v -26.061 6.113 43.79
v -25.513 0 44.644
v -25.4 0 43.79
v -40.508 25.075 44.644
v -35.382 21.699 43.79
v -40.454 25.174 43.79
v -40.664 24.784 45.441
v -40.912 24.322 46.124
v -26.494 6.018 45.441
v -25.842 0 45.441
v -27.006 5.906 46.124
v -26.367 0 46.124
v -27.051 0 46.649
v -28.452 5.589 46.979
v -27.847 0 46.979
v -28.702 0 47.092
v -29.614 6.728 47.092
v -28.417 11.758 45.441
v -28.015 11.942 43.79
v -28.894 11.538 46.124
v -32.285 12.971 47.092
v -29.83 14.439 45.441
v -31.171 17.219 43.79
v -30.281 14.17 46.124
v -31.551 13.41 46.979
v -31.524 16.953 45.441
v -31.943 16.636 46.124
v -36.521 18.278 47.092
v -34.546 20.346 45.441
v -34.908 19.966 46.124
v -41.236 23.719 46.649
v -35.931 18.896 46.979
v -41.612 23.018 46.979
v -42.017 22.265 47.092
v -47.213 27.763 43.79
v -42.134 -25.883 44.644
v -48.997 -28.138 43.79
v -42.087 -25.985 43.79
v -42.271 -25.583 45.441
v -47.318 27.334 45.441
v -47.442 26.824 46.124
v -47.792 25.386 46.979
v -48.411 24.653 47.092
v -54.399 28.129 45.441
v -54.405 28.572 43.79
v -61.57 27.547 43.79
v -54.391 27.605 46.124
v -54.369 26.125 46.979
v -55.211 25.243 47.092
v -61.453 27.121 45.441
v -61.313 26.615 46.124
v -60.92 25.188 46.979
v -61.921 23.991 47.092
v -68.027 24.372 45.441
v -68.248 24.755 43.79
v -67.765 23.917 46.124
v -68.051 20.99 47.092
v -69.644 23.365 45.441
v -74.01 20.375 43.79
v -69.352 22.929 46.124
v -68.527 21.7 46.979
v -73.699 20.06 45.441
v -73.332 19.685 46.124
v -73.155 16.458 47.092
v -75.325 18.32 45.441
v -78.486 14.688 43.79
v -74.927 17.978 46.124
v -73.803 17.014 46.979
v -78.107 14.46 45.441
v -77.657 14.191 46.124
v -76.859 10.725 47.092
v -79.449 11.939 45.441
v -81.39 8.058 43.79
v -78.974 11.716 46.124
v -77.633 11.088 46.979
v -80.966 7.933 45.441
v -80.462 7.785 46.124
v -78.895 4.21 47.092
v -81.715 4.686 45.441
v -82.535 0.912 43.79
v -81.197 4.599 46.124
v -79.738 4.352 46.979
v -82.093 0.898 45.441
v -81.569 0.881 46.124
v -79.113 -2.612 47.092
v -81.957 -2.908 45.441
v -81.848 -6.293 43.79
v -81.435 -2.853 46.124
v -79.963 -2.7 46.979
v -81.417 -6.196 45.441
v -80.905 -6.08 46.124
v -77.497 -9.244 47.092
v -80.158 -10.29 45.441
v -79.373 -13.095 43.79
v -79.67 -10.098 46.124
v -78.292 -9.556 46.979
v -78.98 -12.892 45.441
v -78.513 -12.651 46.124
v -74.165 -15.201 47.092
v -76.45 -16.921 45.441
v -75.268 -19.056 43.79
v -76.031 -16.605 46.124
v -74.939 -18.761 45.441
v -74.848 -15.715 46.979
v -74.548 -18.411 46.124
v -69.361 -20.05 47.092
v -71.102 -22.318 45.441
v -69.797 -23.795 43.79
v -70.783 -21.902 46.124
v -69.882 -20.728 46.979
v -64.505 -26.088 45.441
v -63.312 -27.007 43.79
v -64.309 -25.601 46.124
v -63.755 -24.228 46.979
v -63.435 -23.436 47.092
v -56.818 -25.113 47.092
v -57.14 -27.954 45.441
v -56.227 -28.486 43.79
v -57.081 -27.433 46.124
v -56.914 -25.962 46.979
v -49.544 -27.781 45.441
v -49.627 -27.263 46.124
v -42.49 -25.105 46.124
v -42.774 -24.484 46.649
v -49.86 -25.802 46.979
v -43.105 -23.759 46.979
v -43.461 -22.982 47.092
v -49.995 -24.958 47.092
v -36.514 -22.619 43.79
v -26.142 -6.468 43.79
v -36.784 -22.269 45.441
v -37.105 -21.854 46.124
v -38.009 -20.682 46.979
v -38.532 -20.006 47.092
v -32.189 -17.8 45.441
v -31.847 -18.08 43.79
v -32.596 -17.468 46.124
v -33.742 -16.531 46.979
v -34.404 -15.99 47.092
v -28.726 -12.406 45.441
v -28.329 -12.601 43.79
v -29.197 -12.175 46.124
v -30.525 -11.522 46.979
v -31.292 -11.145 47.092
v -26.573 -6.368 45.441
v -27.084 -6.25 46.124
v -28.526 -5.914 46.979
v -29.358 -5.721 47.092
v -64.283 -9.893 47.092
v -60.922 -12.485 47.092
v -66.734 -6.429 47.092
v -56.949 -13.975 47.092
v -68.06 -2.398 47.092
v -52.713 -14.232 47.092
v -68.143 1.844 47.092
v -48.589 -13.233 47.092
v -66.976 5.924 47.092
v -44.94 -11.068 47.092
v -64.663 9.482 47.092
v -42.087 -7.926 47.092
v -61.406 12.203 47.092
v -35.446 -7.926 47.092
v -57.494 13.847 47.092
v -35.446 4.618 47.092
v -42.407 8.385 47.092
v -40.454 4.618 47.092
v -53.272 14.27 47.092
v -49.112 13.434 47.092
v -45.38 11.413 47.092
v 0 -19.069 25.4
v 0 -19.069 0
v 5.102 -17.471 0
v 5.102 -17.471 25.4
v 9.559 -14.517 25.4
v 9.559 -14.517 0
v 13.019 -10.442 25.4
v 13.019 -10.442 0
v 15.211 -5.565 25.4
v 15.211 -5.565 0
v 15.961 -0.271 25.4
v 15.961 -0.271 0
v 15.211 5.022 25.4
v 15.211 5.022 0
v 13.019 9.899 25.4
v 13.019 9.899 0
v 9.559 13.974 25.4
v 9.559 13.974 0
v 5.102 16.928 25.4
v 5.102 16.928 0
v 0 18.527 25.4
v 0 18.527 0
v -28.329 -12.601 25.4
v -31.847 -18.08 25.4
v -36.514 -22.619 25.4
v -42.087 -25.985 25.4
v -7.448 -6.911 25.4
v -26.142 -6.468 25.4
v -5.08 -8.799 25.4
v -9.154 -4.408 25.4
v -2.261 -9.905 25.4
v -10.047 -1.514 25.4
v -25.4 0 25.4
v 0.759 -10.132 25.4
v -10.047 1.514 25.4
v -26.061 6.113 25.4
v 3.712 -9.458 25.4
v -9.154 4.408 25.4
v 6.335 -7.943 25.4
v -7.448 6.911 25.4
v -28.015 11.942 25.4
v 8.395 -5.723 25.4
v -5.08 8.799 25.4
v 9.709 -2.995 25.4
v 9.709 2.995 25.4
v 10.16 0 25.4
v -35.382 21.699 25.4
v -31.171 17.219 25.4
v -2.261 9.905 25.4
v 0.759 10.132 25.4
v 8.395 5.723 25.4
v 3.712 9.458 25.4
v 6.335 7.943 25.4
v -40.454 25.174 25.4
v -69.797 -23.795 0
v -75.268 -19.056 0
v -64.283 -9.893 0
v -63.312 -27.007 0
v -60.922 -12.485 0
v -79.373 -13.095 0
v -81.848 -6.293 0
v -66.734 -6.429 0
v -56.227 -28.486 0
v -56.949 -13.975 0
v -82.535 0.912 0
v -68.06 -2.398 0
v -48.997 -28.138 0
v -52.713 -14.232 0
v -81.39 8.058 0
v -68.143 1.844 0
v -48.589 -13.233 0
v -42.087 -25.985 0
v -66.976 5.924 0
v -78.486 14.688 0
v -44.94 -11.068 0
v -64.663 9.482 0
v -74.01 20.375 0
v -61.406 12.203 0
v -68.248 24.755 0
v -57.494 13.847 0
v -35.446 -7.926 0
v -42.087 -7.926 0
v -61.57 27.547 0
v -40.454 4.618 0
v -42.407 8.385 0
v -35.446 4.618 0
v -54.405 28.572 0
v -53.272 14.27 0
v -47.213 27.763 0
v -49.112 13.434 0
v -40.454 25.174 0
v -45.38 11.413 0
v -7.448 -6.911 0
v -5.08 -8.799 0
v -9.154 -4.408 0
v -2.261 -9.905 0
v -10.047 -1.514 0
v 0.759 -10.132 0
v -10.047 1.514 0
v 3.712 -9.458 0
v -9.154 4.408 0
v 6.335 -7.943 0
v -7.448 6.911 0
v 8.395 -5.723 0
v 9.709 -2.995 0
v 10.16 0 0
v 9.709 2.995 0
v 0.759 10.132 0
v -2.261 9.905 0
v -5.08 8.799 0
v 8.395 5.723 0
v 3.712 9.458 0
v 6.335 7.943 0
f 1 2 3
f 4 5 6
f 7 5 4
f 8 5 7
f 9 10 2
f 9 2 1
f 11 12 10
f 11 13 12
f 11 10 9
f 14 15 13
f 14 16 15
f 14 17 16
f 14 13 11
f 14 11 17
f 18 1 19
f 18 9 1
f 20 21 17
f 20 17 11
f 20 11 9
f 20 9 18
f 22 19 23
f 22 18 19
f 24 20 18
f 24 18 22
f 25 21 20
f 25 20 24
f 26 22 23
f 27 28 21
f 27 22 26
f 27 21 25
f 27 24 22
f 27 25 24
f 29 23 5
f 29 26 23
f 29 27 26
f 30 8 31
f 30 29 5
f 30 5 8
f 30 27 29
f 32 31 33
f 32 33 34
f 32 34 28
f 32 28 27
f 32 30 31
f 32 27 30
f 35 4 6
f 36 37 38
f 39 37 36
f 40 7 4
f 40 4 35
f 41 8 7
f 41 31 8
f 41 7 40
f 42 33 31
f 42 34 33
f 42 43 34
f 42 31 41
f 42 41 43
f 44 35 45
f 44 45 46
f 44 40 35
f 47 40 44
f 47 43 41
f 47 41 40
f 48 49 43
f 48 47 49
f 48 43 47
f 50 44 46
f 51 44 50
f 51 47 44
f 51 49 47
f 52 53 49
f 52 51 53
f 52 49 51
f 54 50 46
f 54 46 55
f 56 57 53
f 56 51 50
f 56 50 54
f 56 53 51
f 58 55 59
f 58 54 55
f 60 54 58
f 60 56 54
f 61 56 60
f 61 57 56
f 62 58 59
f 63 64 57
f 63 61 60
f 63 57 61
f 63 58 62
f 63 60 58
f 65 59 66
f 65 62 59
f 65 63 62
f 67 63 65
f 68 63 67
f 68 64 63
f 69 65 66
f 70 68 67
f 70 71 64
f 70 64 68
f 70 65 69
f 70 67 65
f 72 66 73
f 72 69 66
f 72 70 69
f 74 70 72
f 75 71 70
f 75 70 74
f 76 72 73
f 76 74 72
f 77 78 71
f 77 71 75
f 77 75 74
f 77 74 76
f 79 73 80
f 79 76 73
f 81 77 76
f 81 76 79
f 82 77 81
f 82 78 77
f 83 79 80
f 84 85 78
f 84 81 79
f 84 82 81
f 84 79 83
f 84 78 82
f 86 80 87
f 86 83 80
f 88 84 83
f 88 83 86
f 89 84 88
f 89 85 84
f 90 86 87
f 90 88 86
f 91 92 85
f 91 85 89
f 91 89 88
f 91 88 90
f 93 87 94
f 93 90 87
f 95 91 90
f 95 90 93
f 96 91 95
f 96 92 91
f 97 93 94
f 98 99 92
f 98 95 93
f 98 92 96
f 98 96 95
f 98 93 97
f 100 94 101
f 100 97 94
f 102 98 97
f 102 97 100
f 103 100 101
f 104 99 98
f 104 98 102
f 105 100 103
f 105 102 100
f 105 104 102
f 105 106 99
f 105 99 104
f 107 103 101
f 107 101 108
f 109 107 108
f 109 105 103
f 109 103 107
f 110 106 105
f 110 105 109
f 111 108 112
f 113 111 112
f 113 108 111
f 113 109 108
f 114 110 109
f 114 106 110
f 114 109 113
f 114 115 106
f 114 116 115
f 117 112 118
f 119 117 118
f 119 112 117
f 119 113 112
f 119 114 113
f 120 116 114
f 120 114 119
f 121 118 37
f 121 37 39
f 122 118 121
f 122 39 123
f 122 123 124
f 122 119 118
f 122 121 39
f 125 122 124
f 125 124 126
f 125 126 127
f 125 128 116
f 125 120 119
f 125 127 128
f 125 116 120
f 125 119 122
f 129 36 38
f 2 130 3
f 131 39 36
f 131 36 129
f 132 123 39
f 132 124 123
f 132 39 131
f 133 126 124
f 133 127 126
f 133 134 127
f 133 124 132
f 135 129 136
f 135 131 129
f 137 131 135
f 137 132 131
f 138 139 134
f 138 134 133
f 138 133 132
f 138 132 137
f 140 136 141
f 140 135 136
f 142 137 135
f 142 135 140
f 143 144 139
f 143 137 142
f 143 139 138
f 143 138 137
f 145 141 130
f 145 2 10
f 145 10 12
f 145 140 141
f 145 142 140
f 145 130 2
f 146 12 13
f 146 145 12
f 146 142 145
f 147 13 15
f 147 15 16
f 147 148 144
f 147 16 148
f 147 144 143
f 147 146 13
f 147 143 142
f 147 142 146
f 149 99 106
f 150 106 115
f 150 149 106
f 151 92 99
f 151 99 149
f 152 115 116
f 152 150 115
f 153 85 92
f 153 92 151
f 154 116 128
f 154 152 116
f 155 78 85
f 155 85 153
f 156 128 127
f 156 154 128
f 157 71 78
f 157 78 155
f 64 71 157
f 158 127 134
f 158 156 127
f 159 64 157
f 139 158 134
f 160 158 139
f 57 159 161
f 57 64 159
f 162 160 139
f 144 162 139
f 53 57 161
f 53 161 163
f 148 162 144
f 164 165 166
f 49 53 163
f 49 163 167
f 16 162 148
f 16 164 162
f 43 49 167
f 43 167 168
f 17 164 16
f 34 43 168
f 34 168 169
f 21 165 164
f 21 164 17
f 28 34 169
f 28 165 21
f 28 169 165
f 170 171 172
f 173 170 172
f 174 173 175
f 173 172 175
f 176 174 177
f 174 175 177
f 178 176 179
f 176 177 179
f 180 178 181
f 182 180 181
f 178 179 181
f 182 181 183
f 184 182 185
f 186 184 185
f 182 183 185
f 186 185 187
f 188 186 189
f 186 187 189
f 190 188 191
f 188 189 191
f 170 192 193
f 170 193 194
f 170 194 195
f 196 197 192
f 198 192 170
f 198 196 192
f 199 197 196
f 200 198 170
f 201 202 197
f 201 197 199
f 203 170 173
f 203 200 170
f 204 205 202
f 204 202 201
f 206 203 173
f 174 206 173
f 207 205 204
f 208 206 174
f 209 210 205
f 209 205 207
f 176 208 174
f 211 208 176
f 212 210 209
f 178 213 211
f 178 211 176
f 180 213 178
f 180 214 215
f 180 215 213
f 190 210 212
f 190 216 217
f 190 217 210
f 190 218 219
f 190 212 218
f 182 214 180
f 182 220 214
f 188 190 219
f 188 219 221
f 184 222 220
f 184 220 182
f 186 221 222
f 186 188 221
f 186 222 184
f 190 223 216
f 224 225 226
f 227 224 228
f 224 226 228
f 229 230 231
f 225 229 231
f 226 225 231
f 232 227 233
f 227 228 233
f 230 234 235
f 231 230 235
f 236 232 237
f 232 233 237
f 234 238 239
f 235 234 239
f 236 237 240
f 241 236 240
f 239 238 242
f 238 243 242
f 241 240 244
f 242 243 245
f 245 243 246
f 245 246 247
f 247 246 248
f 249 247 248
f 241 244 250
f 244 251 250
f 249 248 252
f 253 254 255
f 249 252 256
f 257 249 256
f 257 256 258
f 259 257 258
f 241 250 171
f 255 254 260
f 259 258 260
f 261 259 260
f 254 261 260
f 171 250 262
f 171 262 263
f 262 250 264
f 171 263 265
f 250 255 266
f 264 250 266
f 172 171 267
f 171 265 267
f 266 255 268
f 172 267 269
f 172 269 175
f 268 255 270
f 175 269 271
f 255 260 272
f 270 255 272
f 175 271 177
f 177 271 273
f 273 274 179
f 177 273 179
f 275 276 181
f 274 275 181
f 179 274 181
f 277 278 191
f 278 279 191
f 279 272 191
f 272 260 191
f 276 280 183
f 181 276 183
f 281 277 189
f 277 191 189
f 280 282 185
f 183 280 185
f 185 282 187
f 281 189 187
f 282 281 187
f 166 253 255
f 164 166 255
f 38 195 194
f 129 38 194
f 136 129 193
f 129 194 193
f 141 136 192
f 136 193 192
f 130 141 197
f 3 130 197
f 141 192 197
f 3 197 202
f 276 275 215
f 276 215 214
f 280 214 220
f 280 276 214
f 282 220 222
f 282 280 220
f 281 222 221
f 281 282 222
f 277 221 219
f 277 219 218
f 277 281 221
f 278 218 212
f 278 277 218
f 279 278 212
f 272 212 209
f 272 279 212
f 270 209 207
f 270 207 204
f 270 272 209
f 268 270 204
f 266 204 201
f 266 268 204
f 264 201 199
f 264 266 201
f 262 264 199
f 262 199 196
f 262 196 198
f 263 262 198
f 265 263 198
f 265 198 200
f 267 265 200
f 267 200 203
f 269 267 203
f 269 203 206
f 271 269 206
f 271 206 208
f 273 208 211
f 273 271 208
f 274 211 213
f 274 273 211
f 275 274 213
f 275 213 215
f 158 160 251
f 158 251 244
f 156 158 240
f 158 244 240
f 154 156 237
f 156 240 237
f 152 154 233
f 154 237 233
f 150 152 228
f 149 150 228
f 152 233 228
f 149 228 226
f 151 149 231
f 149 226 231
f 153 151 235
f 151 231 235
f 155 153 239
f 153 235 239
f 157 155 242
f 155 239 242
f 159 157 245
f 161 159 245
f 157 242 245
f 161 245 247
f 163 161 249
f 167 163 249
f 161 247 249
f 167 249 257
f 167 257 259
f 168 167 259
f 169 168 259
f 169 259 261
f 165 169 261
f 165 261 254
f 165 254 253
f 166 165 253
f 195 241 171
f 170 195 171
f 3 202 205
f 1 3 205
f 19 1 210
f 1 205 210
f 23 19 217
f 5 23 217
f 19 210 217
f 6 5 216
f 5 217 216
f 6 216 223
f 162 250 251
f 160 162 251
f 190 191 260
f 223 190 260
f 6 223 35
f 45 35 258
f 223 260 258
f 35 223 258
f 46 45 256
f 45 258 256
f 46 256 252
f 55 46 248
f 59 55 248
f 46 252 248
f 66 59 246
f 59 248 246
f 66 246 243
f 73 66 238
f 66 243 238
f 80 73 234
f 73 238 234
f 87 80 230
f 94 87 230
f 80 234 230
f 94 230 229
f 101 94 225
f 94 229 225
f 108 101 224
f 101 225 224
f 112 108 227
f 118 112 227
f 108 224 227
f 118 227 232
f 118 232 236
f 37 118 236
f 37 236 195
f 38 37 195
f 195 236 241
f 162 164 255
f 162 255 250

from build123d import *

# Parameters (mm, degrees)
F1_DEPTH = 47.0916
F0_R     = 10.16
F2_DEPTH = 25.4
F3_R     = 3.302


with BuildPart() as f1:
    # F0 (on Top) → F1 (new body)
    with BuildSketch(Plane.XY):
        with BuildLine():
            ThreePointArc((-42.087322, -25.984875), (-29.931071, -15.440859), (-25.4, 0))
            ThreePointArc((-25.4, 0), (-29.45069, 14.665908), (-40.454339, 25.173842))
            ThreePointArc((-40.454339, 25.173842), (-82.535454, 0.911648), (-42.087322, -25.984875))
        make_face()
        with BuildLine():
            ThreePointArc((-42.087322, -7.92564), (-68.142943, 1.844467), (-40.454339, 4.617833))
            Line((-40.454339, 4.617833), (-35.4457, 4.617833))
            Line((-35.4457, 4.617833), (-35.4457, -7.92564))
            Line((-35.4457, -7.92564), (-42.087322, -7.92564))
        make_face(mode=Mode.SUBTRACT)
    extrude(amount=F1_DEPTH)

    # F0 (on Top) → F2 (join)
    with BuildSketch(Plane.XY):
        with BuildLine():
            ThreePointArc((-40.454339, 25.173842), (-29.45069, 14.665908), (-25.4, 0))
            ThreePointArc((-25.4, 0), (-29.931071, -15.440859), (-42.087322, -25.984875))
            Line((-42.087322, -25.984875), (0, -19.069276))
            ThreePointArc((0, -19.069276), (15.96121, -0.271354), (0, 18.526568))
            Line((0, 18.526568), (-40.454339, 25.173842))
        make_face()
        Circle(F0_R, mode=Mode.SUBTRACT)
    extrude(amount=F2_DEPTH)

    # F3
    f3_edges = [f1.edges().sort_by_distance(p)[0] for p in [
        (-65.862678, 25.984875, 47.0916),
    ]]
    fillet(f3_edges, radius=F3_R)


solid = f1.part
